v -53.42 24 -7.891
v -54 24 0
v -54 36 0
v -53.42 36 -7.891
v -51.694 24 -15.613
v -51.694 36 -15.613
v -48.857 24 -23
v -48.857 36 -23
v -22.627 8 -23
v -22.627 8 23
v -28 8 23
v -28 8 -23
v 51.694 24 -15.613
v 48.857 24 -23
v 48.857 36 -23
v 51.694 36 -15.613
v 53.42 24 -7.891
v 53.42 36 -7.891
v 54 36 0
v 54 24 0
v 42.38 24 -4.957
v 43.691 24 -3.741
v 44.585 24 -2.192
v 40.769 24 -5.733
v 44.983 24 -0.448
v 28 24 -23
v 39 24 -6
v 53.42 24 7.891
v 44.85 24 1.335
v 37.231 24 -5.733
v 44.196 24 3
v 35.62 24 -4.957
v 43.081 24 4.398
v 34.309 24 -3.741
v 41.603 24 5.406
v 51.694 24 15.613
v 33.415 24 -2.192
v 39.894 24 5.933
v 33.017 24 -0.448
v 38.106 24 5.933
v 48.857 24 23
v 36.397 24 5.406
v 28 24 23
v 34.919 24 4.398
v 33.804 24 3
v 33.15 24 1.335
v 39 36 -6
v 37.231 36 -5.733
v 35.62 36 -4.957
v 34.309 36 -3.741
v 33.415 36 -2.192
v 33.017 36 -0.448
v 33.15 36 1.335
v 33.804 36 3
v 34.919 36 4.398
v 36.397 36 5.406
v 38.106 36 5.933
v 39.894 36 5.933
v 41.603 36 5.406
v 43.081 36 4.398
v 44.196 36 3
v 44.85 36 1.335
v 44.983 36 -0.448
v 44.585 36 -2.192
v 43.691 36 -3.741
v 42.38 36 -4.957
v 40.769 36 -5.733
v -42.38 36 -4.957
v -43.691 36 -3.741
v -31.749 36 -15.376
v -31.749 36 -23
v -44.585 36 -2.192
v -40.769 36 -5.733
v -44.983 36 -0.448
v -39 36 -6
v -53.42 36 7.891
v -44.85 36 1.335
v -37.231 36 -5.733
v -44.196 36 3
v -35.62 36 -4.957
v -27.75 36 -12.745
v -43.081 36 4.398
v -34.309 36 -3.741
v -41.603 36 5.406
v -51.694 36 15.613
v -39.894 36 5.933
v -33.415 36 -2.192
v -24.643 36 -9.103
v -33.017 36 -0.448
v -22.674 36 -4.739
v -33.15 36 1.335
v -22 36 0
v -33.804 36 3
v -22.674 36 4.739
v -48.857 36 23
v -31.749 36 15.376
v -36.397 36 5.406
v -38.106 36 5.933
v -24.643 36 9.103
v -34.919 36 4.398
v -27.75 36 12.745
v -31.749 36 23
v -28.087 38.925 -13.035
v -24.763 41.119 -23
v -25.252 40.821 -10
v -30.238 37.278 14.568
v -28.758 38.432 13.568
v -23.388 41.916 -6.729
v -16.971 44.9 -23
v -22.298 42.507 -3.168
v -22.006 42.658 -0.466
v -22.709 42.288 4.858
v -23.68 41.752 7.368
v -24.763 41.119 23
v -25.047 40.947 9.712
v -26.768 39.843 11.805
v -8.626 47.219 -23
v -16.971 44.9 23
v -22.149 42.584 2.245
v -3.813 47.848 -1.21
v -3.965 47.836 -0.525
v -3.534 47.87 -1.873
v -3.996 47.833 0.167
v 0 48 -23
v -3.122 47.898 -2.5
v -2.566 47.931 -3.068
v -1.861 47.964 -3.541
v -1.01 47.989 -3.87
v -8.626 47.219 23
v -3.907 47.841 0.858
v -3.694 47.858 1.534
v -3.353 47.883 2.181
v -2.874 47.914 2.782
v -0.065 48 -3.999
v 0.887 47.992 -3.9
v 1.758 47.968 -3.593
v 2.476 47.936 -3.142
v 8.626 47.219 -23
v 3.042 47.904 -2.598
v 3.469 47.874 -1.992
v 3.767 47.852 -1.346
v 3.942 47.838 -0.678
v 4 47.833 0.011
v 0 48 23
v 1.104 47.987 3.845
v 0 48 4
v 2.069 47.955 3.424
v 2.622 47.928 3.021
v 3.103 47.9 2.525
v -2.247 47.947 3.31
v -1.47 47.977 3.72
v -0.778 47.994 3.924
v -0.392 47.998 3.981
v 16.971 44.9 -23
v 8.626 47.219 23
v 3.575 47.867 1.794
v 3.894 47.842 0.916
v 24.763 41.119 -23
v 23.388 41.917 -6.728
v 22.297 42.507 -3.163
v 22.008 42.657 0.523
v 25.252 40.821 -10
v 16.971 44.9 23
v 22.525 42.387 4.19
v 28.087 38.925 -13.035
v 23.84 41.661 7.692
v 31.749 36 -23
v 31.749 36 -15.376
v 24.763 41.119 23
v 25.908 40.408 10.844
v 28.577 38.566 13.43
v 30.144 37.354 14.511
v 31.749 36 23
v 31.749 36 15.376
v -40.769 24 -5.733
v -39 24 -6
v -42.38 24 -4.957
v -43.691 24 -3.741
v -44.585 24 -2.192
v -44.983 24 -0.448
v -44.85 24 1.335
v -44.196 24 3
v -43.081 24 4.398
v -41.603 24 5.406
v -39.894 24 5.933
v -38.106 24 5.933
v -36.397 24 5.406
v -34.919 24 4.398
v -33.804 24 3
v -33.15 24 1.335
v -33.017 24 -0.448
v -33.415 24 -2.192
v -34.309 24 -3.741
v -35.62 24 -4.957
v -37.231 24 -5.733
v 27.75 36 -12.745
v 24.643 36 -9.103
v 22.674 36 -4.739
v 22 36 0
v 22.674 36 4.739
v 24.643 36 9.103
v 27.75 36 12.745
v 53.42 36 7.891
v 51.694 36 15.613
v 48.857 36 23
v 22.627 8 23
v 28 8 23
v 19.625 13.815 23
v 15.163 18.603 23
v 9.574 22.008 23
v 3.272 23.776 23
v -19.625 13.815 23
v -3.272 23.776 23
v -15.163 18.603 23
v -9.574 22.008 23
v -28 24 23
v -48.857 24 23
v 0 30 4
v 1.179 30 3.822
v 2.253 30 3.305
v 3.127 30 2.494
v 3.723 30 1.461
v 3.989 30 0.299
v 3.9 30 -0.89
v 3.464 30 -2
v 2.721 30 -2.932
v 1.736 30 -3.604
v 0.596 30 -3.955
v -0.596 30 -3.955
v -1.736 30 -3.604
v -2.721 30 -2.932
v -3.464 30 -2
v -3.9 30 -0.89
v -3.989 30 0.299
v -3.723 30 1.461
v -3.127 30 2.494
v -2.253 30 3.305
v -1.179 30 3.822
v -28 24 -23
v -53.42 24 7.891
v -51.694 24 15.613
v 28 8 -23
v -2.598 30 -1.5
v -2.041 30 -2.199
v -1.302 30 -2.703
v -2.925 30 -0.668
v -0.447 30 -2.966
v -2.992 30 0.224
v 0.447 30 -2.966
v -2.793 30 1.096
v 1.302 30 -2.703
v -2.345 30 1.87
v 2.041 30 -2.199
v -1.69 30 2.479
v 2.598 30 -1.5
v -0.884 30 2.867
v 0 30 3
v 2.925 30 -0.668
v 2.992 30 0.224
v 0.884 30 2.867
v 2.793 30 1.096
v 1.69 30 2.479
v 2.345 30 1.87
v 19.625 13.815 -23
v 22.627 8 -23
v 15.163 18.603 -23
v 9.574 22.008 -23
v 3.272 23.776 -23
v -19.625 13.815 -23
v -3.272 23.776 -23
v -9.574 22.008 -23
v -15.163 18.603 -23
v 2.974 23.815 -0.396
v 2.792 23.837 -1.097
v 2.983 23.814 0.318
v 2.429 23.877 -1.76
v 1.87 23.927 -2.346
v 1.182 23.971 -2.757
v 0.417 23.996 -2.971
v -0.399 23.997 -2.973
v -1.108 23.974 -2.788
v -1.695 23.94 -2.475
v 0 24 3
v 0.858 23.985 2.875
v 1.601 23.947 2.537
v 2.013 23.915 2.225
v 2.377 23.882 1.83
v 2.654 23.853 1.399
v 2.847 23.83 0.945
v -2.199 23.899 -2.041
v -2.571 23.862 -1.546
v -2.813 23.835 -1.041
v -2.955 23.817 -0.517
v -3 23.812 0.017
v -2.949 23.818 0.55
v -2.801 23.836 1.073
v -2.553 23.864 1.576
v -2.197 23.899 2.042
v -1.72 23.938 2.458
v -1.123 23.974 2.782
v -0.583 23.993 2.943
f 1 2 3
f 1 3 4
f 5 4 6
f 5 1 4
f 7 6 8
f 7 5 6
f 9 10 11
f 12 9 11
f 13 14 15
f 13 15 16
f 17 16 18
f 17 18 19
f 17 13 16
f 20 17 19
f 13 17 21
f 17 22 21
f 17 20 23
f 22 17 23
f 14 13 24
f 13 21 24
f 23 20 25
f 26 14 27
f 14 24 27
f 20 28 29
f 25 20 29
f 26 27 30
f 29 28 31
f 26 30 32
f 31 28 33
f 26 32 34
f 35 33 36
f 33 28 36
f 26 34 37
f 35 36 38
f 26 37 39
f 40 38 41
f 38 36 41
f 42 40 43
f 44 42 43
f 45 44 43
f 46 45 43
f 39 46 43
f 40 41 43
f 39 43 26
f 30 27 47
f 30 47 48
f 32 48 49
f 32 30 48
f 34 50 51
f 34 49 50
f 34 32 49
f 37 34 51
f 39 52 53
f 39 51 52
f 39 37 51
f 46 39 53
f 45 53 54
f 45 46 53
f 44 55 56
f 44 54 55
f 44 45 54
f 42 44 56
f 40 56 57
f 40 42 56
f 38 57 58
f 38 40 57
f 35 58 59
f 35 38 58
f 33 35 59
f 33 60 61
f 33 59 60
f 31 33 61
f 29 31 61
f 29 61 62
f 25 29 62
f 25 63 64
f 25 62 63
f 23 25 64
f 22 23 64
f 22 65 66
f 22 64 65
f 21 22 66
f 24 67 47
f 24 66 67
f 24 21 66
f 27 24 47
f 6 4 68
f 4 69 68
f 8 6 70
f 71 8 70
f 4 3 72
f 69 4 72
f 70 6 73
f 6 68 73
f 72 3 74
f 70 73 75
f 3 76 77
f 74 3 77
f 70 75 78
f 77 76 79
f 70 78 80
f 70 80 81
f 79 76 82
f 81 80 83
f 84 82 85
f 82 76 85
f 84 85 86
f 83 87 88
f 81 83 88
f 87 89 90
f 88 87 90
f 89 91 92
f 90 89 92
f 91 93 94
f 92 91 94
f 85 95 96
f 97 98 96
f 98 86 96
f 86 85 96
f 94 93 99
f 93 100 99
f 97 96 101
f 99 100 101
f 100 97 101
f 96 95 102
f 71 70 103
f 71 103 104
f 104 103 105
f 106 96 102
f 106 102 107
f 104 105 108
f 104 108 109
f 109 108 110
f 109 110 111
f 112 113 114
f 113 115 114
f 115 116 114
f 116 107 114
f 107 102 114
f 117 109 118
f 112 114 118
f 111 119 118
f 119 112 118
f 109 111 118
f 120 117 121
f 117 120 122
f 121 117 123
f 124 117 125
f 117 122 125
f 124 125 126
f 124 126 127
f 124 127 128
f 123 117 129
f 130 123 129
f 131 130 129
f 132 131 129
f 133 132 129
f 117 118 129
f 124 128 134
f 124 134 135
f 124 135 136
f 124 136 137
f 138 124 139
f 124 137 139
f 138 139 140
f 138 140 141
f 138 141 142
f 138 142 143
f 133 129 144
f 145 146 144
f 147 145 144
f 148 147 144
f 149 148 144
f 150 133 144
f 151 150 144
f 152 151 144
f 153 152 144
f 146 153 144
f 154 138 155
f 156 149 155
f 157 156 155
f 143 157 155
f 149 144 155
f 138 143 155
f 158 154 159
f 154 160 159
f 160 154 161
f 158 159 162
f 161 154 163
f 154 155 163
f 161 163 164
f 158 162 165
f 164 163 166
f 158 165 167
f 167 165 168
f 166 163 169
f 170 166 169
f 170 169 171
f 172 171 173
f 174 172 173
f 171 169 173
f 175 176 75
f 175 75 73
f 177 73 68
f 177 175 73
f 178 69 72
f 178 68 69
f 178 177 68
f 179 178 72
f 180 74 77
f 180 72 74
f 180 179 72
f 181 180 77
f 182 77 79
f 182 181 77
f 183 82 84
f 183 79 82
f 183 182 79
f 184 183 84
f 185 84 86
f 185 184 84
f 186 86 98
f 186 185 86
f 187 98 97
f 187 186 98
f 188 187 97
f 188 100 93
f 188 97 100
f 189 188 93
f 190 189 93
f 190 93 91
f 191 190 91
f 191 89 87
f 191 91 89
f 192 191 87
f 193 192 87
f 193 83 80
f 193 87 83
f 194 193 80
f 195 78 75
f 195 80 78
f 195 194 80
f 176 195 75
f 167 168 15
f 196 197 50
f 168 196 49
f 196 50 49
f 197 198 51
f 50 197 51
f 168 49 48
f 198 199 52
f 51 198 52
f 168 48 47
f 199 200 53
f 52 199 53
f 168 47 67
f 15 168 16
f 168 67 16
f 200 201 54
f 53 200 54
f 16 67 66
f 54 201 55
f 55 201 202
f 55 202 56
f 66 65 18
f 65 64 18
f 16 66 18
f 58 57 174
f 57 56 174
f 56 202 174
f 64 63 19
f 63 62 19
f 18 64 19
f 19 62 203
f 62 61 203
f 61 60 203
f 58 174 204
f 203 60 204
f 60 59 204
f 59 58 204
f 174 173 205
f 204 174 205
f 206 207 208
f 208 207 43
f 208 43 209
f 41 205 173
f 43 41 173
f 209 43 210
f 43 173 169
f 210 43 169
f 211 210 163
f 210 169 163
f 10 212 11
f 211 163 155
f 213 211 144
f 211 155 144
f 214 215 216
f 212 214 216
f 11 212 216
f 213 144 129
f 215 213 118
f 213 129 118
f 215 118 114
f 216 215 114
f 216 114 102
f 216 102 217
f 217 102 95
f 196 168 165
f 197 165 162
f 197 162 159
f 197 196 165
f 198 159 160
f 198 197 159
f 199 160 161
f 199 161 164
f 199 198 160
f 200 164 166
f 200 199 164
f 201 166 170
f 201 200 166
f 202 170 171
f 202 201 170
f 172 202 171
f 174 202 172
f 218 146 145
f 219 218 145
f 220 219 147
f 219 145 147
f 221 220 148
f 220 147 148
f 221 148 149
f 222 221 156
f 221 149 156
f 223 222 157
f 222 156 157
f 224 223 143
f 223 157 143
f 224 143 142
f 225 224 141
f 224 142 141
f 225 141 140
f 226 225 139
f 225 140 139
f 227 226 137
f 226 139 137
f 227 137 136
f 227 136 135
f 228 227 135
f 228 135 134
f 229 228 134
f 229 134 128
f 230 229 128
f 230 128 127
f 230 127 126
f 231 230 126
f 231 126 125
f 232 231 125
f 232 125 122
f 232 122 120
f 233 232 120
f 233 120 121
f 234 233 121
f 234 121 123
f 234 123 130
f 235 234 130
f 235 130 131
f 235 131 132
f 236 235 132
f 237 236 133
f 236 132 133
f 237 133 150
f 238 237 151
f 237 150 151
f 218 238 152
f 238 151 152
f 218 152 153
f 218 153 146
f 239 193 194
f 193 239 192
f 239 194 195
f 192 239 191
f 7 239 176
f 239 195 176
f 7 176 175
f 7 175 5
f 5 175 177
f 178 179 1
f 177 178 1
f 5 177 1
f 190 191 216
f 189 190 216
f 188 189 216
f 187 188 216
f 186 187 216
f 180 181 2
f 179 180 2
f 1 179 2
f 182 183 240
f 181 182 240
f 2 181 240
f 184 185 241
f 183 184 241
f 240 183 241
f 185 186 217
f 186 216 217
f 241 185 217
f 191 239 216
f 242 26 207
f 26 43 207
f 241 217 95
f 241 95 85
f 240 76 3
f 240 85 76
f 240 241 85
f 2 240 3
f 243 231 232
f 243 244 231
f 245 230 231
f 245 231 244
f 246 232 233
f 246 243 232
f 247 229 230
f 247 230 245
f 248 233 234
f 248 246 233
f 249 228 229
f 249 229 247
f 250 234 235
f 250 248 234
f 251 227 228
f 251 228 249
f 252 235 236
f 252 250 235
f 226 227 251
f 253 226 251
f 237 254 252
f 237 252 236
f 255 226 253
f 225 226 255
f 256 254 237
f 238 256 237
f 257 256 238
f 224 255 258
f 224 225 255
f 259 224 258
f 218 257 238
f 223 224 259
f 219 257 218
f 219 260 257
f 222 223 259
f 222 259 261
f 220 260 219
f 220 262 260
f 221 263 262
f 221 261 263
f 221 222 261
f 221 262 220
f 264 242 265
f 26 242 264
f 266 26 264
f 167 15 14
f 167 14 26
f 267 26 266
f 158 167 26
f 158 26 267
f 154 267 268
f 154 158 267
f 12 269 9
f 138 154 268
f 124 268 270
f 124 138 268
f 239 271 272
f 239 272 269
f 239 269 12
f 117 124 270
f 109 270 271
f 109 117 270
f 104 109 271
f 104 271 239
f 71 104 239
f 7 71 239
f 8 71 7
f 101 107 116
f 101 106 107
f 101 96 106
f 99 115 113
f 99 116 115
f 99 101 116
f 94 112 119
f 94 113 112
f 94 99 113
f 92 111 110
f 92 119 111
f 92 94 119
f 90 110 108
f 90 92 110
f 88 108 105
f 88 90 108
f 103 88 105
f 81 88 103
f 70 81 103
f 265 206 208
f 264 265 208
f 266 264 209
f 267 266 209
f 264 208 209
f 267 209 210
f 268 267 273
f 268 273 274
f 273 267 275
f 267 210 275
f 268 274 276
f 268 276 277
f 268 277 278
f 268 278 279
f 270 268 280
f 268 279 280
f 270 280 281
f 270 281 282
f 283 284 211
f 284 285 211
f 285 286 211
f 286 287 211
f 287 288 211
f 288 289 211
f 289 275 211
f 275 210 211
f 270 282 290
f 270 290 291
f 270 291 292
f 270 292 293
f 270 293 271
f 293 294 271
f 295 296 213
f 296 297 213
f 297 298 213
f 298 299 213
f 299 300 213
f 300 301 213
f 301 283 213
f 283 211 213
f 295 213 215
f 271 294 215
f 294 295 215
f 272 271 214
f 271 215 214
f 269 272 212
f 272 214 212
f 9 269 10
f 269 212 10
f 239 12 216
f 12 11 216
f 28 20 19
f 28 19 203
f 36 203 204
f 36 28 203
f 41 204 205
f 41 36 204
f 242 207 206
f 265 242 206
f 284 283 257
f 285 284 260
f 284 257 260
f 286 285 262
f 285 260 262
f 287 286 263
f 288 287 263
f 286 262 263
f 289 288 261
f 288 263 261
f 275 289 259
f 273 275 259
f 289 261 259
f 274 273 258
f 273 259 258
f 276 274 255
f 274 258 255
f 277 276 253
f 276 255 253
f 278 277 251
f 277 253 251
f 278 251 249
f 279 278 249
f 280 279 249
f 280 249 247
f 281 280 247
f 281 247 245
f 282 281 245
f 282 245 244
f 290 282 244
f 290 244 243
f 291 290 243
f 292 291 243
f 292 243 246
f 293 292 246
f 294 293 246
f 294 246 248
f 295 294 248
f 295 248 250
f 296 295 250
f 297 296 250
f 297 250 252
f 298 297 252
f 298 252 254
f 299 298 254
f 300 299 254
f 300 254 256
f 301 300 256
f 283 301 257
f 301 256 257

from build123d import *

# Parameters (mm, degrees)
BOSS_EXTRUDE1_DEPTH = 23
CUT_EXTRUDE1_START  = 24
CUT_EXTRUDE1_DEPTH  = 12
SKETCH5_R           = 6
CUT_EXTRUDE2_DEPTH  = 76.822160349
SKETCH6_R           = 17
CUT_EXTRUDE3_DEPTH  = 46
SKETCH10_R          = 4
CUT_EXTRUDE6_DEPTH  = 20
SKETCH11_R          = 3
CUT_EXTRUDE7_DEPTH  = 63.681735814


# Read off the part's stored shape, not the designer's step: Cut-Extrude1
with BuildPart() as part:
    # Sketch1 → Boss-Extrude1 (new, symmetric)
    with BuildSketch(Plane.XY):
        with BuildLine():
            Line((-22.627416998, 8), (-28, 8))
            Line((-28, 8), (-28, 24))
            Line((-28, 24), (-54, 24))
            Line((-54, 24), (-54, 36))
            Line((-54, 36), (-31.749015733, 36))
            ThreePointArc((-31.749015733, 36), (0, 48), (31.749015733, 36))
            Line((31.749015733, 36), (54, 36))
            Line((54, 36), (54, 24))
            Line((54, 24), (28, 24))
            Line((28, 24), (28, 8))
            Line((28, 8), (22.627416998, 8))
            ThreePointArc((22.627416998, 8), (0, 24), (-22.627416998, 8))
        make_face()
    extrude(amount=BOSS_EXTRUDE1_DEPTH, both=True)

    # Cut-Extrude1 outline → Cut-Extrude1 (cut)
    with BuildSketch(Plane(origin=(0, 0, 0), x_dir=(1, 0, 0), z_dir=(0, 1, 0)).offset(CUT_EXTRUDE1_START)):
        with BuildLine():
            Line((-54, -23), (-48.856934001, -23))
            ThreePointArc((-48.856934001, -23), (-52.698550436, -11.784005345), (-54, 0))
            Line((-54, 0), (-54, -23))
        make_face()
        with BuildLine():
            Line((-54, 23), (-54, 0))
            ThreePointArc((-54, 0), (-52.698550436, 11.784005345), (-48.856934001, 23))
            Line((-48.856934001, 23), (-54, 23))
        make_face()
        with BuildLine():
            ThreePointArc((54, 0), (52.698550436, -11.784005345), (48.856934001, -23))
            Line((48.856934001, -23), (54, -23))
            Line((54, -23), (54, 0))
        make_face()
        with BuildLine():
            ThreePointArc((48.856934001, 23), (52.698550436, 11.784005345), (54, 0))
            Line((54, 0), (54, 23))
            Line((54, 23), (48.856934001, 23))
        make_face()
    extrude(amount=CUT_EXTRUDE1_DEPTH, mode=Mode.SUBTRACT)

    # Sketch5 → Cut-Extrude2 (cut, through all)
    with BuildSketch(Plane(origin=(0, 0, 0), x_dir=(1, 0, 0), z_dir=(0, 1, 0))):
        with Locations(Location((-39, 0, 0), (0, 0, 90))):
            Circle(SKETCH5_R)
        with Locations(Location((39, 0, 0), (0, 0, 90))):
            Circle(SKETCH5_R)
    extrude(amount=CUT_EXTRUDE2_DEPTH, mode=Mode.SUBTRACT)

    # Sketch6 → Cut-Extrude3 (cut)
    with BuildSketch(Plane(origin=(0, 36, 0), x_dir=(1, 0, 0), z_dir=(0, 1, 0))):
        with Locations((-39, 0)):
            Circle(SKETCH6_R)
        with Locations((39, 0)):
            Circle(SKETCH6_R)
    extrude(amount=CUT_EXTRUDE3_DEPTH, mode=Mode.SUBTRACT)

    # Sketch10 → Cut-Extrude6 (cut)
    with BuildSketch(Plane(origin=(0, 50, 0), x_dir=(1, 0, 0), z_dir=(0, 1, 0))):
        with Locations(Location((0, 0, 0), (0, 0, 270))):
            Circle(SKETCH10_R)
    extrude(amount=-CUT_EXTRUDE6_DEPTH, mode=Mode.SUBTRACT)

    # Sketch11 → Cut-Extrude7 (cut, through all)
    with BuildSketch(Plane(origin=(0, 30, 0), x_dir=(1, 0, 0), z_dir=(0, 1, 0))):
        with Locations(Location((0, 0, 0), (0, 0, 270))):
            Circle(SKETCH11_R)
    extrude(amount=-CUT_EXTRUDE7_DEPTH, mode=Mode.SUBTRACT)


solid = part.part
